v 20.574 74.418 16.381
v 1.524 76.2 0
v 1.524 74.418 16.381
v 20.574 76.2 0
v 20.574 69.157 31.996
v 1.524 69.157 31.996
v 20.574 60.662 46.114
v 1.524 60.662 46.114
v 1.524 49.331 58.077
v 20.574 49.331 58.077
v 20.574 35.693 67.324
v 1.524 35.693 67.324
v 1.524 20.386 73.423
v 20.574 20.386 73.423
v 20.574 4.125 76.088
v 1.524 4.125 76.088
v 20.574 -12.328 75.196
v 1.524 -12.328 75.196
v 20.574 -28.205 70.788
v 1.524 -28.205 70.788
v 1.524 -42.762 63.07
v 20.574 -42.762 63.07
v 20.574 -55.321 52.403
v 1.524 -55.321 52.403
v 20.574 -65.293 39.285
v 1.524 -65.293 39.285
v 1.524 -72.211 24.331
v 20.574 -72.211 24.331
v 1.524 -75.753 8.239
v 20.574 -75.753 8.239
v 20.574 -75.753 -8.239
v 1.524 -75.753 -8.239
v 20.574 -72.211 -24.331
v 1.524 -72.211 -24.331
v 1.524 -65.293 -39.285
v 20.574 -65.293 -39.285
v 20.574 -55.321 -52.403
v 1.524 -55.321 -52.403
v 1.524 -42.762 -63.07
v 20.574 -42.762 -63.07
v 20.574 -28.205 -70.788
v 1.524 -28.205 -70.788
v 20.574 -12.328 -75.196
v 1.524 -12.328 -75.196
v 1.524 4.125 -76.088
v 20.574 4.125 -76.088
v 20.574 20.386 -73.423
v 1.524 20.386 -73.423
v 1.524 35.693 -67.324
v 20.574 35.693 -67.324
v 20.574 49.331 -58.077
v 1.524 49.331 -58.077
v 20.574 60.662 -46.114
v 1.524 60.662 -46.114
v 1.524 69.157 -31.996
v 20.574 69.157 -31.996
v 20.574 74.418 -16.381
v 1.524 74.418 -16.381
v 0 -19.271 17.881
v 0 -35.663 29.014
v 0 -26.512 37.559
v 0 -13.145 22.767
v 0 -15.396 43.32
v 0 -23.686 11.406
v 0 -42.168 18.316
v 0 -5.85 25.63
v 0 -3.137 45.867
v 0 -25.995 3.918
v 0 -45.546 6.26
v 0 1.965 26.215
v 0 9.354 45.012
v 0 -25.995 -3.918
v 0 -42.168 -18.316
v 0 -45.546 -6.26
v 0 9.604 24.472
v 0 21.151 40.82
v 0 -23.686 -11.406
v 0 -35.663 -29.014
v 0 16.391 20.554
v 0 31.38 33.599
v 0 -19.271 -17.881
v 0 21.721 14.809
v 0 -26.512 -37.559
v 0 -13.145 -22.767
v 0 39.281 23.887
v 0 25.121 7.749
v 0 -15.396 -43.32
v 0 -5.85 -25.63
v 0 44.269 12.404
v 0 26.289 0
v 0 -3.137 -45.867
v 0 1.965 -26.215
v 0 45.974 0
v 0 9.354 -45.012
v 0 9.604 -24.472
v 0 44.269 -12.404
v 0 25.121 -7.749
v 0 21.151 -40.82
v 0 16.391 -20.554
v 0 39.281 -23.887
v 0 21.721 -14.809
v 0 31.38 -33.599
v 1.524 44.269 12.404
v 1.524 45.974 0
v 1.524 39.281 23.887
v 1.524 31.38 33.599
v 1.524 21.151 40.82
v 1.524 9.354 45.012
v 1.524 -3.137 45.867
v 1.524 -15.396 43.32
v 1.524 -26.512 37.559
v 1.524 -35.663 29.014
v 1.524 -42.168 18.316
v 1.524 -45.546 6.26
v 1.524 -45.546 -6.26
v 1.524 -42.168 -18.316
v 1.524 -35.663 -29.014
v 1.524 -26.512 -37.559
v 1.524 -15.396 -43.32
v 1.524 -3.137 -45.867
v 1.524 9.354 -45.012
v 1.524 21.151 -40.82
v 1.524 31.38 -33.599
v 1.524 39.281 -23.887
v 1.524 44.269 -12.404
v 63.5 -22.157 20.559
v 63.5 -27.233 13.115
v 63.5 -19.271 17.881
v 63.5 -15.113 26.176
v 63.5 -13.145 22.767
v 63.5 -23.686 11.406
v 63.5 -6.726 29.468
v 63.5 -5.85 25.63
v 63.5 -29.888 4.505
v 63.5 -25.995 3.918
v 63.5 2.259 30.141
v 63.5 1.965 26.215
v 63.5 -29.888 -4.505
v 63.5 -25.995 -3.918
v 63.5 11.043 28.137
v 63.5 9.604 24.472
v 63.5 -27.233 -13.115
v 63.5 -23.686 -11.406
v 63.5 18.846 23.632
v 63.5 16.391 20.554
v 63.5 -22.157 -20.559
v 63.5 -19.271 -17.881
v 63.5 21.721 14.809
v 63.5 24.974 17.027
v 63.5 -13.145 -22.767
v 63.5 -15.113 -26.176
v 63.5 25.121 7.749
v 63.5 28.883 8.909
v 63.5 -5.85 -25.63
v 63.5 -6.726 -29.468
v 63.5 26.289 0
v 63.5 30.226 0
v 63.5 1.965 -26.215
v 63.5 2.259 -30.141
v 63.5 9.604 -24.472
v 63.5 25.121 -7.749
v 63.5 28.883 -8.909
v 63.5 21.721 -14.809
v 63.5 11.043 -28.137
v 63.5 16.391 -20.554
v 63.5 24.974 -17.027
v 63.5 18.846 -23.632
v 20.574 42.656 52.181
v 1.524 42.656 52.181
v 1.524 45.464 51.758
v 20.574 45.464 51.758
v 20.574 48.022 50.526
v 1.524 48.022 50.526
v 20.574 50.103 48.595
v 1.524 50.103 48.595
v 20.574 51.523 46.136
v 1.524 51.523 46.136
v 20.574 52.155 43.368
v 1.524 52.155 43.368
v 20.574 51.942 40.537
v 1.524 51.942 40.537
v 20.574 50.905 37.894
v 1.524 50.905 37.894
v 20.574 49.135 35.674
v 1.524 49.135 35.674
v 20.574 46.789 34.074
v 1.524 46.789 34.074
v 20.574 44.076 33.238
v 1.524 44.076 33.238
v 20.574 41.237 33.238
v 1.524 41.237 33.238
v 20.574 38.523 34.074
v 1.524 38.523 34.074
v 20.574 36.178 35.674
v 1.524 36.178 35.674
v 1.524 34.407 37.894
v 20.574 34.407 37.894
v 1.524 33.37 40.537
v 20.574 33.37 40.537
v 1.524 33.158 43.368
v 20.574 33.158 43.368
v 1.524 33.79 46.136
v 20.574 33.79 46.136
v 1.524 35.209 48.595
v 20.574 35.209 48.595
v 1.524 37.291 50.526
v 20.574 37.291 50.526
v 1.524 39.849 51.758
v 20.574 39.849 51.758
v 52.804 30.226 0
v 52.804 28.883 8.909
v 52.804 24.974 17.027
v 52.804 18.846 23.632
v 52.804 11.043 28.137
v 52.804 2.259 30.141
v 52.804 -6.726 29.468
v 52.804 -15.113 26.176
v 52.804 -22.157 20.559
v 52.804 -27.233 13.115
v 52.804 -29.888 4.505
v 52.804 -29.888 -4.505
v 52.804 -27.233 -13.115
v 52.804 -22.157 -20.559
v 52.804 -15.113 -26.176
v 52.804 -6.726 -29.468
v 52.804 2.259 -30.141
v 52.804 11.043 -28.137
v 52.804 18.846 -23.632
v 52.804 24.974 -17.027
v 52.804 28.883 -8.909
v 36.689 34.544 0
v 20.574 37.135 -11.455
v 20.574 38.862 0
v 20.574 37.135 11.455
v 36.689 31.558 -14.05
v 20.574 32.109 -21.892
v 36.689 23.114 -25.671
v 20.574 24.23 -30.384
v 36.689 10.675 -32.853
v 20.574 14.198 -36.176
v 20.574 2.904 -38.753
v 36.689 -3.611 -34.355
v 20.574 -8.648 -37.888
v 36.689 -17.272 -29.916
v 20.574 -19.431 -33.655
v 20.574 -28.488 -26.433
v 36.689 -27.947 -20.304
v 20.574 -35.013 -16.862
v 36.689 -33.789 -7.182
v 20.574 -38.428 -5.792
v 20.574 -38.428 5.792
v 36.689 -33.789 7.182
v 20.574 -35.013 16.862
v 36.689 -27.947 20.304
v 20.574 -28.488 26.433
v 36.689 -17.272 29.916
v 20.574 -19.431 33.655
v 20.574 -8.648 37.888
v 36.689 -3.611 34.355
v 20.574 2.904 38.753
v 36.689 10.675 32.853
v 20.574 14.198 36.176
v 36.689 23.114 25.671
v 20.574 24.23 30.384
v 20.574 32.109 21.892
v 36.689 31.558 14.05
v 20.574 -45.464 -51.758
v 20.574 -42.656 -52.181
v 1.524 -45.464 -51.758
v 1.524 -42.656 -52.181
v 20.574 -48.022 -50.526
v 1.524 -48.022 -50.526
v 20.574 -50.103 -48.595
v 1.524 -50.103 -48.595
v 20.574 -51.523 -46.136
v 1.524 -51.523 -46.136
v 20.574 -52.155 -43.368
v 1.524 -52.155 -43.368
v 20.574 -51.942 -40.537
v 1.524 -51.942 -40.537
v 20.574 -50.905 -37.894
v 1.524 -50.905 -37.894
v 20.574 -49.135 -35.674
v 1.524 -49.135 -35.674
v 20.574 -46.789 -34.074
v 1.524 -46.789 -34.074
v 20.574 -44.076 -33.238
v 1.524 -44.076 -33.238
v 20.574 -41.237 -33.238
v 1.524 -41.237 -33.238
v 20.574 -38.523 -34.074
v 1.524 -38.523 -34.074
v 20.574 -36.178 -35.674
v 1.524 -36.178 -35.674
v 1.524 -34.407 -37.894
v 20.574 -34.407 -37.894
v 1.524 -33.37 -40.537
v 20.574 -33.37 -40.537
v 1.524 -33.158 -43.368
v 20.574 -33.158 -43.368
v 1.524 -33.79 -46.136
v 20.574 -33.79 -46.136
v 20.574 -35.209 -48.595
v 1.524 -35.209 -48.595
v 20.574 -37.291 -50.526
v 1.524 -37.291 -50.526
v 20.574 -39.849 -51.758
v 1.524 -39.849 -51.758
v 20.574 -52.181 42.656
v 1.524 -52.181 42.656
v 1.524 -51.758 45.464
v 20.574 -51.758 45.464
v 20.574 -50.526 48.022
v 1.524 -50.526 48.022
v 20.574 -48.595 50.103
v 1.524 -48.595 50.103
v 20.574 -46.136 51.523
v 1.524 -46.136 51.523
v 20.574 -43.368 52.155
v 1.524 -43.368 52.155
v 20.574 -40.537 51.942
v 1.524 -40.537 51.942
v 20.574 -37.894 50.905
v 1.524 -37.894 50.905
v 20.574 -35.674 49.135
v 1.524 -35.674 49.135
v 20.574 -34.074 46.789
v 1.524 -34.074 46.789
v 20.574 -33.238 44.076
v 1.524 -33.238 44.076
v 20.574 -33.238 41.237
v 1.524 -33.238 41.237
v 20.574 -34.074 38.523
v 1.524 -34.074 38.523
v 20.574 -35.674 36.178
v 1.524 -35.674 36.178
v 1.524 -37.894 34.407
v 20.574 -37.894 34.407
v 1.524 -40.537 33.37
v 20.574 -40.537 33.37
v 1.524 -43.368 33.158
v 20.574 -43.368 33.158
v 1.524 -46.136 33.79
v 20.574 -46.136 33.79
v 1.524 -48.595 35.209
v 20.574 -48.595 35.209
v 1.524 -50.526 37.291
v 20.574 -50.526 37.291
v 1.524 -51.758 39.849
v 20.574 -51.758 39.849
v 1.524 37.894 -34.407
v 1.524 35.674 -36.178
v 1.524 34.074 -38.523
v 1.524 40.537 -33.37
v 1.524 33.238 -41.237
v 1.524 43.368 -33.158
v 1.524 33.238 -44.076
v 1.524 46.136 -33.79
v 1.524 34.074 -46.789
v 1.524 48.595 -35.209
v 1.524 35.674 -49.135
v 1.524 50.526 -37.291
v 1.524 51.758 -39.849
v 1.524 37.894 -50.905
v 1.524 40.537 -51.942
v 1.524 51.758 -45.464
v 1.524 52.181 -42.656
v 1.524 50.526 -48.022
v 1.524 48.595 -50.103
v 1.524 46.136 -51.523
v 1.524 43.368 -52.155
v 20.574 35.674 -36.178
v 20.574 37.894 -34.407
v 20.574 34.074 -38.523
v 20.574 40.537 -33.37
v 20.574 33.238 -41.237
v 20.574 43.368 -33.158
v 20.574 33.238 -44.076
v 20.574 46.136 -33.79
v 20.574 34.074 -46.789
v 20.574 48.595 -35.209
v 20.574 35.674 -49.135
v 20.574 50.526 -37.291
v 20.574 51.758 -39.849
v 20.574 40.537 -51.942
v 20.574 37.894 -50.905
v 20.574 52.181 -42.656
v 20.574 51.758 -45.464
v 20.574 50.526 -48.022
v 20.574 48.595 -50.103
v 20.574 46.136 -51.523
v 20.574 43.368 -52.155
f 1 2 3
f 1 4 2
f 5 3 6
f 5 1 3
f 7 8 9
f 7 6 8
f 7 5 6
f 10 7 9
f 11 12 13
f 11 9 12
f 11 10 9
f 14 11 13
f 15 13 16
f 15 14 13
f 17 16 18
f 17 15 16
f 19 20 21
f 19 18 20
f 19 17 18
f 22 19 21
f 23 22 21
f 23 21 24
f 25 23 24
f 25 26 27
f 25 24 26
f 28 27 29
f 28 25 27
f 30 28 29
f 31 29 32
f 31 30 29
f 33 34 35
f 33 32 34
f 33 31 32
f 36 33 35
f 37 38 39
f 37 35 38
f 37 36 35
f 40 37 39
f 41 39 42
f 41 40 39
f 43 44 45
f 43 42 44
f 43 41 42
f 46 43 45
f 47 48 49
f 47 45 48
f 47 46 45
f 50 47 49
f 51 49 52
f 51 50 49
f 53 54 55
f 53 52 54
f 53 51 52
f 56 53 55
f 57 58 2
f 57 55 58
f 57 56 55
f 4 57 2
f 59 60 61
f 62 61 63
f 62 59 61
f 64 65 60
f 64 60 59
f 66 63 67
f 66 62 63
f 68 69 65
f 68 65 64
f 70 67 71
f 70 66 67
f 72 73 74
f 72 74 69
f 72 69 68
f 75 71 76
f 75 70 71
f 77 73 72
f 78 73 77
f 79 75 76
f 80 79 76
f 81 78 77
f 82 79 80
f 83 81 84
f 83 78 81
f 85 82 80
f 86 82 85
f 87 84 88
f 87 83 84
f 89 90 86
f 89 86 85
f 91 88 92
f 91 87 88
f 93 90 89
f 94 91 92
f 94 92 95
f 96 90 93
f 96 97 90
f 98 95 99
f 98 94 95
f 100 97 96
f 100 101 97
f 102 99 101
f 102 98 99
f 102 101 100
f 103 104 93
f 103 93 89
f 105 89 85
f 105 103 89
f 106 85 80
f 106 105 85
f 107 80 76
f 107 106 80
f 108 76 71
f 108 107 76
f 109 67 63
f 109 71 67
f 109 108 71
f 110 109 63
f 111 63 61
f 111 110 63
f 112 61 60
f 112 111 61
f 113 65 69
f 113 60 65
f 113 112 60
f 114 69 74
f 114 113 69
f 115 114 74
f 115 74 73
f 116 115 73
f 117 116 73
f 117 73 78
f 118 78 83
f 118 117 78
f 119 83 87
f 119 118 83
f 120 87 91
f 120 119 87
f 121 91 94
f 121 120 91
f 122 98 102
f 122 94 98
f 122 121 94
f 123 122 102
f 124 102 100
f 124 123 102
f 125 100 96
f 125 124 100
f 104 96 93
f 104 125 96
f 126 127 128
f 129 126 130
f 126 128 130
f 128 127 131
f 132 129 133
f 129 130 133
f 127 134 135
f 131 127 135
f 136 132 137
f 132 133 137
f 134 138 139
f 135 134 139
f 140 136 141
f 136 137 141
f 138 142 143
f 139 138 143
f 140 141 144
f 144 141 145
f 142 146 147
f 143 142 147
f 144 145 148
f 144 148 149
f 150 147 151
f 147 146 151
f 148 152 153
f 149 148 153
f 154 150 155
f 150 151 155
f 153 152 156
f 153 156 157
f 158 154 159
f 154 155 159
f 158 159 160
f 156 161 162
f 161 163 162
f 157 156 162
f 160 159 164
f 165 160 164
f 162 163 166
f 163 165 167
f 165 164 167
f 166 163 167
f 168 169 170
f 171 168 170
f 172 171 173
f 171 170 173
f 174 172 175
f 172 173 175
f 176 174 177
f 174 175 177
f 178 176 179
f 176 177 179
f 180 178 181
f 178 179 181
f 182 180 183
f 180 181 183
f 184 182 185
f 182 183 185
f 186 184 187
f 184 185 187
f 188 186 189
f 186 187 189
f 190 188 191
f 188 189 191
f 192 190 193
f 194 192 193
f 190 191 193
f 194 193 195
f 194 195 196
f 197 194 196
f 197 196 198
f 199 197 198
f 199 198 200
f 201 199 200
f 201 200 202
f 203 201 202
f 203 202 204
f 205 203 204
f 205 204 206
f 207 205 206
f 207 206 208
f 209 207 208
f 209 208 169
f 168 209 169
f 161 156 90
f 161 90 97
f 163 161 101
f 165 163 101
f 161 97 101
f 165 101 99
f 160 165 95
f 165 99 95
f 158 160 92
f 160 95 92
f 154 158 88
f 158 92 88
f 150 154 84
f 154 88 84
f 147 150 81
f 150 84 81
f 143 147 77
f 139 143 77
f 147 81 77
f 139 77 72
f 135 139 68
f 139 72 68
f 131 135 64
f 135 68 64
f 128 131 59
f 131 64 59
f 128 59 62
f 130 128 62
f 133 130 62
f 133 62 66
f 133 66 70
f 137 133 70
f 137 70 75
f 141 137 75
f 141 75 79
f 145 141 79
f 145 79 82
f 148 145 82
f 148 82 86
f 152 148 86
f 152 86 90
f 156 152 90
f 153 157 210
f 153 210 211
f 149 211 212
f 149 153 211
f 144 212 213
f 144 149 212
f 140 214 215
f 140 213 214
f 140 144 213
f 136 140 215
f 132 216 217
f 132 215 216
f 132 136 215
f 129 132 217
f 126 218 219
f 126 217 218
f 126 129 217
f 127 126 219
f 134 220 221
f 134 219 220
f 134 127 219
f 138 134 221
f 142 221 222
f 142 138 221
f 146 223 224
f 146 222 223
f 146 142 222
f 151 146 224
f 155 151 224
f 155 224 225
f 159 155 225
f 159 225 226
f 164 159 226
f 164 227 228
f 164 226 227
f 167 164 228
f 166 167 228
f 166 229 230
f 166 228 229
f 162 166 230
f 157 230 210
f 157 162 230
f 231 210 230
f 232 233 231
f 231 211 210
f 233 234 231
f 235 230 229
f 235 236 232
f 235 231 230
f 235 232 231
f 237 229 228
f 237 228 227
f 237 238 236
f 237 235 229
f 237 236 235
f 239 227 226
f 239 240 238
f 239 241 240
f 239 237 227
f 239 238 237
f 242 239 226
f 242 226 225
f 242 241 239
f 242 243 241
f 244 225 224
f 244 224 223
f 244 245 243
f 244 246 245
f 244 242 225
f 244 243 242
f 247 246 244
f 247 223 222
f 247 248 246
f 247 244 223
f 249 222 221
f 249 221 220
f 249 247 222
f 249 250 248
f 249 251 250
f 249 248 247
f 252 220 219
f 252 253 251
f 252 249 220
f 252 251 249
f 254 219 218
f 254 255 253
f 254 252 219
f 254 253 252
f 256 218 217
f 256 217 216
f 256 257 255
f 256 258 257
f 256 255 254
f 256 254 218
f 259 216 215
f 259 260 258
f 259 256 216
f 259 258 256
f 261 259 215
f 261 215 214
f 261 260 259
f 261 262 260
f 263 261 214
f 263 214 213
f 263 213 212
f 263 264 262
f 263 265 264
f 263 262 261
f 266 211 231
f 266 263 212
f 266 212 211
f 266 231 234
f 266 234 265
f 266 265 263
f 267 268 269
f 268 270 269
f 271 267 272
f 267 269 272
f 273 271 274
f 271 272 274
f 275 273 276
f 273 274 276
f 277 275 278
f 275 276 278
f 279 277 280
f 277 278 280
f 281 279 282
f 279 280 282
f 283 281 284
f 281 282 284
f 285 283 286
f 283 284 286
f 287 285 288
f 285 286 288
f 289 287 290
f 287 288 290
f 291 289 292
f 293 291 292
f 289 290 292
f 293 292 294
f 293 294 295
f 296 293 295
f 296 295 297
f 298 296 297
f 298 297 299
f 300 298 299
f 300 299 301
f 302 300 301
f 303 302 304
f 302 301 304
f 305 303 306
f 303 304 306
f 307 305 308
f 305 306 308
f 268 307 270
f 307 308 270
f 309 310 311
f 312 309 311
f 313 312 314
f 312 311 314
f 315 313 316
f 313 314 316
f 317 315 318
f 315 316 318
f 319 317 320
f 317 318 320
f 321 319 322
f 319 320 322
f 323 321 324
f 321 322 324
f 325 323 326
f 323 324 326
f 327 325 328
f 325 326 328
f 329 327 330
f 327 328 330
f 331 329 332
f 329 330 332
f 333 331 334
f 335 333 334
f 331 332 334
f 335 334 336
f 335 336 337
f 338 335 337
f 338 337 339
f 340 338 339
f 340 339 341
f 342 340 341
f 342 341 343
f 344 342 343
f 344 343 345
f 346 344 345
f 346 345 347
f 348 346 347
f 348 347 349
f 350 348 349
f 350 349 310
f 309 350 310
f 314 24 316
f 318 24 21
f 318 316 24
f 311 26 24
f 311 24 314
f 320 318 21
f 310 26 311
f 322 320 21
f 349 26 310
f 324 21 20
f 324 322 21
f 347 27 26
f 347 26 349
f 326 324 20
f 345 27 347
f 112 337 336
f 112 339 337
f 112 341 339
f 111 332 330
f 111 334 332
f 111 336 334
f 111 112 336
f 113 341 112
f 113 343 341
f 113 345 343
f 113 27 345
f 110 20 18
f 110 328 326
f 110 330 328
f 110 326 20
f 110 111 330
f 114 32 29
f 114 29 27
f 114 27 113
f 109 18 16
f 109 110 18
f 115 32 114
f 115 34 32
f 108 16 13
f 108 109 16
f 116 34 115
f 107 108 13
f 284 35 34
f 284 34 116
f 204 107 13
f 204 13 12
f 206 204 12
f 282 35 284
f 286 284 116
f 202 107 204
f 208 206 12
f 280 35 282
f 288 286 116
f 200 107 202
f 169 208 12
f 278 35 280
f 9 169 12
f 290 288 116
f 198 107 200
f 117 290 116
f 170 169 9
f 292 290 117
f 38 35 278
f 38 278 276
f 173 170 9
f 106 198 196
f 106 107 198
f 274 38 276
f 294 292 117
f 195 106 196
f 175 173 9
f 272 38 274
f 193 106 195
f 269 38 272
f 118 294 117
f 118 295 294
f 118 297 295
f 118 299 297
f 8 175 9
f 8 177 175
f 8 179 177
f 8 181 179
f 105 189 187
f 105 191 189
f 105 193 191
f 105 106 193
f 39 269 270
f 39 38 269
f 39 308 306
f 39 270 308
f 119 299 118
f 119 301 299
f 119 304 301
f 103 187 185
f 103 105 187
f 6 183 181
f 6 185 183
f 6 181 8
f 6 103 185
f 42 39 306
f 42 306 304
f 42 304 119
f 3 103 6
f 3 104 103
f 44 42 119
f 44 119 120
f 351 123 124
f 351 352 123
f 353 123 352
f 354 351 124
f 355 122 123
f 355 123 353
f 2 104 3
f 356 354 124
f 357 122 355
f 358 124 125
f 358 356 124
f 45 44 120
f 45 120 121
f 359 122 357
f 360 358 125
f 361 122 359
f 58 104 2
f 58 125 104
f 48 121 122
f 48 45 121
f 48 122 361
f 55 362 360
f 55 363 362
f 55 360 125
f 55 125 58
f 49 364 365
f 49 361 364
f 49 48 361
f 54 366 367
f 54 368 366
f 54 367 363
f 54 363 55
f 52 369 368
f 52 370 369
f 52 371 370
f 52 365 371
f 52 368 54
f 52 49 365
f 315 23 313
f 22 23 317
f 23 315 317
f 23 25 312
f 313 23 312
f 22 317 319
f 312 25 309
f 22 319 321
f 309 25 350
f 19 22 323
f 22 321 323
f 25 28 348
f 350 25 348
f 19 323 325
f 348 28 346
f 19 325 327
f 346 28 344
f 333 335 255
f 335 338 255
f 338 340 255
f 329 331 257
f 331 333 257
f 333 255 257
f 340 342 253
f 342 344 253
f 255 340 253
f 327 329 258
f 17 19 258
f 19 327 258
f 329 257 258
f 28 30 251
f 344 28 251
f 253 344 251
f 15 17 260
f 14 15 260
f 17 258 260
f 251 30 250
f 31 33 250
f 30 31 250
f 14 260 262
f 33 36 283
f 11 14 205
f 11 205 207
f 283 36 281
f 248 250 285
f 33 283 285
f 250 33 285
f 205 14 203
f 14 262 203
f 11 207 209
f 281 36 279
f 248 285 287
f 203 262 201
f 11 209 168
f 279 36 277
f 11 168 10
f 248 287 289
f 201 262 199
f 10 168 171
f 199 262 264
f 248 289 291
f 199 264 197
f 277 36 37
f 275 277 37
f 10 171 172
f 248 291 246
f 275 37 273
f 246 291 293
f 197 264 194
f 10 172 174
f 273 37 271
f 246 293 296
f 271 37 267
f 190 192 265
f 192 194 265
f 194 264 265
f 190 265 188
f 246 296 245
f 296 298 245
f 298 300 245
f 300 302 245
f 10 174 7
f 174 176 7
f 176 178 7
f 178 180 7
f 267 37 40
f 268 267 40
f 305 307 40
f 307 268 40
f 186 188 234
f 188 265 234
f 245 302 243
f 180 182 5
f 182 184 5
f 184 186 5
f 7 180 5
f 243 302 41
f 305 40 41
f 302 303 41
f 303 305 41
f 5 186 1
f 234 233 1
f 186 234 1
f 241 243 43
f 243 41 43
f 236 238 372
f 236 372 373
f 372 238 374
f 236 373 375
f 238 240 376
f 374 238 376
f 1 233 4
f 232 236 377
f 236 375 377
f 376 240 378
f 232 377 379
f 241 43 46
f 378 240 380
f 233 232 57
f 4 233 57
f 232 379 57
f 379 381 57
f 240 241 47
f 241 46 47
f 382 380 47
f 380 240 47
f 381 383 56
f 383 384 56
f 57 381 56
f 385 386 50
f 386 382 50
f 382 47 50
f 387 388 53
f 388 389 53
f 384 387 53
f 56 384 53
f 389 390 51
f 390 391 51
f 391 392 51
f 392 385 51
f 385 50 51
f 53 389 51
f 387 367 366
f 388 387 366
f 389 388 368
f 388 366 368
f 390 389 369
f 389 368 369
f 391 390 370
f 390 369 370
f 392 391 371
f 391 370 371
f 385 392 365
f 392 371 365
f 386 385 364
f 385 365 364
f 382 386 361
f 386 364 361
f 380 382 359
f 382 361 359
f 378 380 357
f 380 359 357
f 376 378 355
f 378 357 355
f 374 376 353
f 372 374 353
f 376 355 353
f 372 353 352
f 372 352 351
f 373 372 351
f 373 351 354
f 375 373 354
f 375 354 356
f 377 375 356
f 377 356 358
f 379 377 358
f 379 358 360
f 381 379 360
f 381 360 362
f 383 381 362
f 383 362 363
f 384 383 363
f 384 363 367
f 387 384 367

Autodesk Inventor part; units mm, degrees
ref_plane "YZ Plane" through (0, 0, 0) normal (1, 0, 0) x (0, 1, 0)
ref_plane "XZ Plane" through (0, 0, 0) normal (0, 1, 0) x (-1, 0, 0)
ref_plane "XY Plane" through (0, 0, 0) normal (0, 0, 1) x (1, 0, 0)
sketch "Sketch1" plane through (0, 0, 0) normal (0, 0, 1) x (1, 0, 0)
  line L0 (0, 0) -> (0, 45.974)
  line L1 (0, 45.974) -> (1.524, 45.974)
  line L2 (1.524, 45.974) -> (1.524, 76.2)
  line L3 (1.524, 76.2) -> (20.574, 76.2)
  line L4 (20.574, 76.2) -> (20.574, 38.862)
  line L5 (20.574, 38.862) -> (52.804, 30.226)
  line L6 (52.804, 30.226) -> (63.5, 30.226)
  line L7 (63.5, 30.226) -> (63.5, 0)
  line L8 (63.5, 0) -> (0, 0)
  line L9 (63.5, 26.289) -> (0, 26.289)
  dimension "d0" = 152.4
  dimension "d1" = 91.948
  dimension "d2" = 1.524
  dimension "d3" = 52.578
  dimension "d4" = 60.452
  dimension "d7" = 77.724
  dimension "d8" = 15
  dimension "d18" = 19.05
  dimension "d19" = 61.976
revolve "Revolution1" add sketch "Sketch1" angle 360 about axis through (63.5, 0, 0) along (-1, 0, 0) contours L0 L1 L2 L3 L4 L5 L6 L7 L9
sketch "Sketch2" plane through (1.524, 0, 0) normal (-1, 0, 0) x (0, 0, 1)
  circle A0 centre (0, 0) radius 76.2 projected
  circle A1 centre (0, 0) radius 45.974 projected
  circle A2 centre (42.6562, 42.6562) radius 9.525
  line L0 (42.6562, 42.6562) -> (0, 0) construction
  circle A3 centre (0, 0) radius 60.325 construction
  line L1 (0, 0) -> (60.325, 0) construction
  dimension "d10" = 60.325
  dimension "d11" = 19.05
  dimension "d17" = 45
extrude "Extrusion1" cut sketch "Sketch2" against normal through all contours A2
pattern_circular "Circular Pattern1" count 4 over 360 about axis through (36.689, 0, 0) along (1, 0, 0) of "Extrusion1"
equation "\"d0\" = O"
equation "\"d1\" = R"
equation "\"d3\" = B"
equation "\"d4\" = A"
equation "\"d7\" = X"
equation "\"d18\" = C1"
equation "\"d19\" = Y"
equation "\"d10\" = 0.5 * BC"
equation "\"d11\" = DH"
equation "\"O\" = 152.4"
equation "\"C1\" = 19.05"
equation "\"X\" = 77.724"
equation "\"A\" = 60.452"
equation "\"Y\" = 61.976"
equation "\"B\" = 52.578"
equation "\"BC\" = 120.65"
equation "\"DH\" = 19.05"
equation "\"R\" = 91.948"
properties part number "ASME B16.5 Flange Welding Neck - Class 150 2" material "Steel"
